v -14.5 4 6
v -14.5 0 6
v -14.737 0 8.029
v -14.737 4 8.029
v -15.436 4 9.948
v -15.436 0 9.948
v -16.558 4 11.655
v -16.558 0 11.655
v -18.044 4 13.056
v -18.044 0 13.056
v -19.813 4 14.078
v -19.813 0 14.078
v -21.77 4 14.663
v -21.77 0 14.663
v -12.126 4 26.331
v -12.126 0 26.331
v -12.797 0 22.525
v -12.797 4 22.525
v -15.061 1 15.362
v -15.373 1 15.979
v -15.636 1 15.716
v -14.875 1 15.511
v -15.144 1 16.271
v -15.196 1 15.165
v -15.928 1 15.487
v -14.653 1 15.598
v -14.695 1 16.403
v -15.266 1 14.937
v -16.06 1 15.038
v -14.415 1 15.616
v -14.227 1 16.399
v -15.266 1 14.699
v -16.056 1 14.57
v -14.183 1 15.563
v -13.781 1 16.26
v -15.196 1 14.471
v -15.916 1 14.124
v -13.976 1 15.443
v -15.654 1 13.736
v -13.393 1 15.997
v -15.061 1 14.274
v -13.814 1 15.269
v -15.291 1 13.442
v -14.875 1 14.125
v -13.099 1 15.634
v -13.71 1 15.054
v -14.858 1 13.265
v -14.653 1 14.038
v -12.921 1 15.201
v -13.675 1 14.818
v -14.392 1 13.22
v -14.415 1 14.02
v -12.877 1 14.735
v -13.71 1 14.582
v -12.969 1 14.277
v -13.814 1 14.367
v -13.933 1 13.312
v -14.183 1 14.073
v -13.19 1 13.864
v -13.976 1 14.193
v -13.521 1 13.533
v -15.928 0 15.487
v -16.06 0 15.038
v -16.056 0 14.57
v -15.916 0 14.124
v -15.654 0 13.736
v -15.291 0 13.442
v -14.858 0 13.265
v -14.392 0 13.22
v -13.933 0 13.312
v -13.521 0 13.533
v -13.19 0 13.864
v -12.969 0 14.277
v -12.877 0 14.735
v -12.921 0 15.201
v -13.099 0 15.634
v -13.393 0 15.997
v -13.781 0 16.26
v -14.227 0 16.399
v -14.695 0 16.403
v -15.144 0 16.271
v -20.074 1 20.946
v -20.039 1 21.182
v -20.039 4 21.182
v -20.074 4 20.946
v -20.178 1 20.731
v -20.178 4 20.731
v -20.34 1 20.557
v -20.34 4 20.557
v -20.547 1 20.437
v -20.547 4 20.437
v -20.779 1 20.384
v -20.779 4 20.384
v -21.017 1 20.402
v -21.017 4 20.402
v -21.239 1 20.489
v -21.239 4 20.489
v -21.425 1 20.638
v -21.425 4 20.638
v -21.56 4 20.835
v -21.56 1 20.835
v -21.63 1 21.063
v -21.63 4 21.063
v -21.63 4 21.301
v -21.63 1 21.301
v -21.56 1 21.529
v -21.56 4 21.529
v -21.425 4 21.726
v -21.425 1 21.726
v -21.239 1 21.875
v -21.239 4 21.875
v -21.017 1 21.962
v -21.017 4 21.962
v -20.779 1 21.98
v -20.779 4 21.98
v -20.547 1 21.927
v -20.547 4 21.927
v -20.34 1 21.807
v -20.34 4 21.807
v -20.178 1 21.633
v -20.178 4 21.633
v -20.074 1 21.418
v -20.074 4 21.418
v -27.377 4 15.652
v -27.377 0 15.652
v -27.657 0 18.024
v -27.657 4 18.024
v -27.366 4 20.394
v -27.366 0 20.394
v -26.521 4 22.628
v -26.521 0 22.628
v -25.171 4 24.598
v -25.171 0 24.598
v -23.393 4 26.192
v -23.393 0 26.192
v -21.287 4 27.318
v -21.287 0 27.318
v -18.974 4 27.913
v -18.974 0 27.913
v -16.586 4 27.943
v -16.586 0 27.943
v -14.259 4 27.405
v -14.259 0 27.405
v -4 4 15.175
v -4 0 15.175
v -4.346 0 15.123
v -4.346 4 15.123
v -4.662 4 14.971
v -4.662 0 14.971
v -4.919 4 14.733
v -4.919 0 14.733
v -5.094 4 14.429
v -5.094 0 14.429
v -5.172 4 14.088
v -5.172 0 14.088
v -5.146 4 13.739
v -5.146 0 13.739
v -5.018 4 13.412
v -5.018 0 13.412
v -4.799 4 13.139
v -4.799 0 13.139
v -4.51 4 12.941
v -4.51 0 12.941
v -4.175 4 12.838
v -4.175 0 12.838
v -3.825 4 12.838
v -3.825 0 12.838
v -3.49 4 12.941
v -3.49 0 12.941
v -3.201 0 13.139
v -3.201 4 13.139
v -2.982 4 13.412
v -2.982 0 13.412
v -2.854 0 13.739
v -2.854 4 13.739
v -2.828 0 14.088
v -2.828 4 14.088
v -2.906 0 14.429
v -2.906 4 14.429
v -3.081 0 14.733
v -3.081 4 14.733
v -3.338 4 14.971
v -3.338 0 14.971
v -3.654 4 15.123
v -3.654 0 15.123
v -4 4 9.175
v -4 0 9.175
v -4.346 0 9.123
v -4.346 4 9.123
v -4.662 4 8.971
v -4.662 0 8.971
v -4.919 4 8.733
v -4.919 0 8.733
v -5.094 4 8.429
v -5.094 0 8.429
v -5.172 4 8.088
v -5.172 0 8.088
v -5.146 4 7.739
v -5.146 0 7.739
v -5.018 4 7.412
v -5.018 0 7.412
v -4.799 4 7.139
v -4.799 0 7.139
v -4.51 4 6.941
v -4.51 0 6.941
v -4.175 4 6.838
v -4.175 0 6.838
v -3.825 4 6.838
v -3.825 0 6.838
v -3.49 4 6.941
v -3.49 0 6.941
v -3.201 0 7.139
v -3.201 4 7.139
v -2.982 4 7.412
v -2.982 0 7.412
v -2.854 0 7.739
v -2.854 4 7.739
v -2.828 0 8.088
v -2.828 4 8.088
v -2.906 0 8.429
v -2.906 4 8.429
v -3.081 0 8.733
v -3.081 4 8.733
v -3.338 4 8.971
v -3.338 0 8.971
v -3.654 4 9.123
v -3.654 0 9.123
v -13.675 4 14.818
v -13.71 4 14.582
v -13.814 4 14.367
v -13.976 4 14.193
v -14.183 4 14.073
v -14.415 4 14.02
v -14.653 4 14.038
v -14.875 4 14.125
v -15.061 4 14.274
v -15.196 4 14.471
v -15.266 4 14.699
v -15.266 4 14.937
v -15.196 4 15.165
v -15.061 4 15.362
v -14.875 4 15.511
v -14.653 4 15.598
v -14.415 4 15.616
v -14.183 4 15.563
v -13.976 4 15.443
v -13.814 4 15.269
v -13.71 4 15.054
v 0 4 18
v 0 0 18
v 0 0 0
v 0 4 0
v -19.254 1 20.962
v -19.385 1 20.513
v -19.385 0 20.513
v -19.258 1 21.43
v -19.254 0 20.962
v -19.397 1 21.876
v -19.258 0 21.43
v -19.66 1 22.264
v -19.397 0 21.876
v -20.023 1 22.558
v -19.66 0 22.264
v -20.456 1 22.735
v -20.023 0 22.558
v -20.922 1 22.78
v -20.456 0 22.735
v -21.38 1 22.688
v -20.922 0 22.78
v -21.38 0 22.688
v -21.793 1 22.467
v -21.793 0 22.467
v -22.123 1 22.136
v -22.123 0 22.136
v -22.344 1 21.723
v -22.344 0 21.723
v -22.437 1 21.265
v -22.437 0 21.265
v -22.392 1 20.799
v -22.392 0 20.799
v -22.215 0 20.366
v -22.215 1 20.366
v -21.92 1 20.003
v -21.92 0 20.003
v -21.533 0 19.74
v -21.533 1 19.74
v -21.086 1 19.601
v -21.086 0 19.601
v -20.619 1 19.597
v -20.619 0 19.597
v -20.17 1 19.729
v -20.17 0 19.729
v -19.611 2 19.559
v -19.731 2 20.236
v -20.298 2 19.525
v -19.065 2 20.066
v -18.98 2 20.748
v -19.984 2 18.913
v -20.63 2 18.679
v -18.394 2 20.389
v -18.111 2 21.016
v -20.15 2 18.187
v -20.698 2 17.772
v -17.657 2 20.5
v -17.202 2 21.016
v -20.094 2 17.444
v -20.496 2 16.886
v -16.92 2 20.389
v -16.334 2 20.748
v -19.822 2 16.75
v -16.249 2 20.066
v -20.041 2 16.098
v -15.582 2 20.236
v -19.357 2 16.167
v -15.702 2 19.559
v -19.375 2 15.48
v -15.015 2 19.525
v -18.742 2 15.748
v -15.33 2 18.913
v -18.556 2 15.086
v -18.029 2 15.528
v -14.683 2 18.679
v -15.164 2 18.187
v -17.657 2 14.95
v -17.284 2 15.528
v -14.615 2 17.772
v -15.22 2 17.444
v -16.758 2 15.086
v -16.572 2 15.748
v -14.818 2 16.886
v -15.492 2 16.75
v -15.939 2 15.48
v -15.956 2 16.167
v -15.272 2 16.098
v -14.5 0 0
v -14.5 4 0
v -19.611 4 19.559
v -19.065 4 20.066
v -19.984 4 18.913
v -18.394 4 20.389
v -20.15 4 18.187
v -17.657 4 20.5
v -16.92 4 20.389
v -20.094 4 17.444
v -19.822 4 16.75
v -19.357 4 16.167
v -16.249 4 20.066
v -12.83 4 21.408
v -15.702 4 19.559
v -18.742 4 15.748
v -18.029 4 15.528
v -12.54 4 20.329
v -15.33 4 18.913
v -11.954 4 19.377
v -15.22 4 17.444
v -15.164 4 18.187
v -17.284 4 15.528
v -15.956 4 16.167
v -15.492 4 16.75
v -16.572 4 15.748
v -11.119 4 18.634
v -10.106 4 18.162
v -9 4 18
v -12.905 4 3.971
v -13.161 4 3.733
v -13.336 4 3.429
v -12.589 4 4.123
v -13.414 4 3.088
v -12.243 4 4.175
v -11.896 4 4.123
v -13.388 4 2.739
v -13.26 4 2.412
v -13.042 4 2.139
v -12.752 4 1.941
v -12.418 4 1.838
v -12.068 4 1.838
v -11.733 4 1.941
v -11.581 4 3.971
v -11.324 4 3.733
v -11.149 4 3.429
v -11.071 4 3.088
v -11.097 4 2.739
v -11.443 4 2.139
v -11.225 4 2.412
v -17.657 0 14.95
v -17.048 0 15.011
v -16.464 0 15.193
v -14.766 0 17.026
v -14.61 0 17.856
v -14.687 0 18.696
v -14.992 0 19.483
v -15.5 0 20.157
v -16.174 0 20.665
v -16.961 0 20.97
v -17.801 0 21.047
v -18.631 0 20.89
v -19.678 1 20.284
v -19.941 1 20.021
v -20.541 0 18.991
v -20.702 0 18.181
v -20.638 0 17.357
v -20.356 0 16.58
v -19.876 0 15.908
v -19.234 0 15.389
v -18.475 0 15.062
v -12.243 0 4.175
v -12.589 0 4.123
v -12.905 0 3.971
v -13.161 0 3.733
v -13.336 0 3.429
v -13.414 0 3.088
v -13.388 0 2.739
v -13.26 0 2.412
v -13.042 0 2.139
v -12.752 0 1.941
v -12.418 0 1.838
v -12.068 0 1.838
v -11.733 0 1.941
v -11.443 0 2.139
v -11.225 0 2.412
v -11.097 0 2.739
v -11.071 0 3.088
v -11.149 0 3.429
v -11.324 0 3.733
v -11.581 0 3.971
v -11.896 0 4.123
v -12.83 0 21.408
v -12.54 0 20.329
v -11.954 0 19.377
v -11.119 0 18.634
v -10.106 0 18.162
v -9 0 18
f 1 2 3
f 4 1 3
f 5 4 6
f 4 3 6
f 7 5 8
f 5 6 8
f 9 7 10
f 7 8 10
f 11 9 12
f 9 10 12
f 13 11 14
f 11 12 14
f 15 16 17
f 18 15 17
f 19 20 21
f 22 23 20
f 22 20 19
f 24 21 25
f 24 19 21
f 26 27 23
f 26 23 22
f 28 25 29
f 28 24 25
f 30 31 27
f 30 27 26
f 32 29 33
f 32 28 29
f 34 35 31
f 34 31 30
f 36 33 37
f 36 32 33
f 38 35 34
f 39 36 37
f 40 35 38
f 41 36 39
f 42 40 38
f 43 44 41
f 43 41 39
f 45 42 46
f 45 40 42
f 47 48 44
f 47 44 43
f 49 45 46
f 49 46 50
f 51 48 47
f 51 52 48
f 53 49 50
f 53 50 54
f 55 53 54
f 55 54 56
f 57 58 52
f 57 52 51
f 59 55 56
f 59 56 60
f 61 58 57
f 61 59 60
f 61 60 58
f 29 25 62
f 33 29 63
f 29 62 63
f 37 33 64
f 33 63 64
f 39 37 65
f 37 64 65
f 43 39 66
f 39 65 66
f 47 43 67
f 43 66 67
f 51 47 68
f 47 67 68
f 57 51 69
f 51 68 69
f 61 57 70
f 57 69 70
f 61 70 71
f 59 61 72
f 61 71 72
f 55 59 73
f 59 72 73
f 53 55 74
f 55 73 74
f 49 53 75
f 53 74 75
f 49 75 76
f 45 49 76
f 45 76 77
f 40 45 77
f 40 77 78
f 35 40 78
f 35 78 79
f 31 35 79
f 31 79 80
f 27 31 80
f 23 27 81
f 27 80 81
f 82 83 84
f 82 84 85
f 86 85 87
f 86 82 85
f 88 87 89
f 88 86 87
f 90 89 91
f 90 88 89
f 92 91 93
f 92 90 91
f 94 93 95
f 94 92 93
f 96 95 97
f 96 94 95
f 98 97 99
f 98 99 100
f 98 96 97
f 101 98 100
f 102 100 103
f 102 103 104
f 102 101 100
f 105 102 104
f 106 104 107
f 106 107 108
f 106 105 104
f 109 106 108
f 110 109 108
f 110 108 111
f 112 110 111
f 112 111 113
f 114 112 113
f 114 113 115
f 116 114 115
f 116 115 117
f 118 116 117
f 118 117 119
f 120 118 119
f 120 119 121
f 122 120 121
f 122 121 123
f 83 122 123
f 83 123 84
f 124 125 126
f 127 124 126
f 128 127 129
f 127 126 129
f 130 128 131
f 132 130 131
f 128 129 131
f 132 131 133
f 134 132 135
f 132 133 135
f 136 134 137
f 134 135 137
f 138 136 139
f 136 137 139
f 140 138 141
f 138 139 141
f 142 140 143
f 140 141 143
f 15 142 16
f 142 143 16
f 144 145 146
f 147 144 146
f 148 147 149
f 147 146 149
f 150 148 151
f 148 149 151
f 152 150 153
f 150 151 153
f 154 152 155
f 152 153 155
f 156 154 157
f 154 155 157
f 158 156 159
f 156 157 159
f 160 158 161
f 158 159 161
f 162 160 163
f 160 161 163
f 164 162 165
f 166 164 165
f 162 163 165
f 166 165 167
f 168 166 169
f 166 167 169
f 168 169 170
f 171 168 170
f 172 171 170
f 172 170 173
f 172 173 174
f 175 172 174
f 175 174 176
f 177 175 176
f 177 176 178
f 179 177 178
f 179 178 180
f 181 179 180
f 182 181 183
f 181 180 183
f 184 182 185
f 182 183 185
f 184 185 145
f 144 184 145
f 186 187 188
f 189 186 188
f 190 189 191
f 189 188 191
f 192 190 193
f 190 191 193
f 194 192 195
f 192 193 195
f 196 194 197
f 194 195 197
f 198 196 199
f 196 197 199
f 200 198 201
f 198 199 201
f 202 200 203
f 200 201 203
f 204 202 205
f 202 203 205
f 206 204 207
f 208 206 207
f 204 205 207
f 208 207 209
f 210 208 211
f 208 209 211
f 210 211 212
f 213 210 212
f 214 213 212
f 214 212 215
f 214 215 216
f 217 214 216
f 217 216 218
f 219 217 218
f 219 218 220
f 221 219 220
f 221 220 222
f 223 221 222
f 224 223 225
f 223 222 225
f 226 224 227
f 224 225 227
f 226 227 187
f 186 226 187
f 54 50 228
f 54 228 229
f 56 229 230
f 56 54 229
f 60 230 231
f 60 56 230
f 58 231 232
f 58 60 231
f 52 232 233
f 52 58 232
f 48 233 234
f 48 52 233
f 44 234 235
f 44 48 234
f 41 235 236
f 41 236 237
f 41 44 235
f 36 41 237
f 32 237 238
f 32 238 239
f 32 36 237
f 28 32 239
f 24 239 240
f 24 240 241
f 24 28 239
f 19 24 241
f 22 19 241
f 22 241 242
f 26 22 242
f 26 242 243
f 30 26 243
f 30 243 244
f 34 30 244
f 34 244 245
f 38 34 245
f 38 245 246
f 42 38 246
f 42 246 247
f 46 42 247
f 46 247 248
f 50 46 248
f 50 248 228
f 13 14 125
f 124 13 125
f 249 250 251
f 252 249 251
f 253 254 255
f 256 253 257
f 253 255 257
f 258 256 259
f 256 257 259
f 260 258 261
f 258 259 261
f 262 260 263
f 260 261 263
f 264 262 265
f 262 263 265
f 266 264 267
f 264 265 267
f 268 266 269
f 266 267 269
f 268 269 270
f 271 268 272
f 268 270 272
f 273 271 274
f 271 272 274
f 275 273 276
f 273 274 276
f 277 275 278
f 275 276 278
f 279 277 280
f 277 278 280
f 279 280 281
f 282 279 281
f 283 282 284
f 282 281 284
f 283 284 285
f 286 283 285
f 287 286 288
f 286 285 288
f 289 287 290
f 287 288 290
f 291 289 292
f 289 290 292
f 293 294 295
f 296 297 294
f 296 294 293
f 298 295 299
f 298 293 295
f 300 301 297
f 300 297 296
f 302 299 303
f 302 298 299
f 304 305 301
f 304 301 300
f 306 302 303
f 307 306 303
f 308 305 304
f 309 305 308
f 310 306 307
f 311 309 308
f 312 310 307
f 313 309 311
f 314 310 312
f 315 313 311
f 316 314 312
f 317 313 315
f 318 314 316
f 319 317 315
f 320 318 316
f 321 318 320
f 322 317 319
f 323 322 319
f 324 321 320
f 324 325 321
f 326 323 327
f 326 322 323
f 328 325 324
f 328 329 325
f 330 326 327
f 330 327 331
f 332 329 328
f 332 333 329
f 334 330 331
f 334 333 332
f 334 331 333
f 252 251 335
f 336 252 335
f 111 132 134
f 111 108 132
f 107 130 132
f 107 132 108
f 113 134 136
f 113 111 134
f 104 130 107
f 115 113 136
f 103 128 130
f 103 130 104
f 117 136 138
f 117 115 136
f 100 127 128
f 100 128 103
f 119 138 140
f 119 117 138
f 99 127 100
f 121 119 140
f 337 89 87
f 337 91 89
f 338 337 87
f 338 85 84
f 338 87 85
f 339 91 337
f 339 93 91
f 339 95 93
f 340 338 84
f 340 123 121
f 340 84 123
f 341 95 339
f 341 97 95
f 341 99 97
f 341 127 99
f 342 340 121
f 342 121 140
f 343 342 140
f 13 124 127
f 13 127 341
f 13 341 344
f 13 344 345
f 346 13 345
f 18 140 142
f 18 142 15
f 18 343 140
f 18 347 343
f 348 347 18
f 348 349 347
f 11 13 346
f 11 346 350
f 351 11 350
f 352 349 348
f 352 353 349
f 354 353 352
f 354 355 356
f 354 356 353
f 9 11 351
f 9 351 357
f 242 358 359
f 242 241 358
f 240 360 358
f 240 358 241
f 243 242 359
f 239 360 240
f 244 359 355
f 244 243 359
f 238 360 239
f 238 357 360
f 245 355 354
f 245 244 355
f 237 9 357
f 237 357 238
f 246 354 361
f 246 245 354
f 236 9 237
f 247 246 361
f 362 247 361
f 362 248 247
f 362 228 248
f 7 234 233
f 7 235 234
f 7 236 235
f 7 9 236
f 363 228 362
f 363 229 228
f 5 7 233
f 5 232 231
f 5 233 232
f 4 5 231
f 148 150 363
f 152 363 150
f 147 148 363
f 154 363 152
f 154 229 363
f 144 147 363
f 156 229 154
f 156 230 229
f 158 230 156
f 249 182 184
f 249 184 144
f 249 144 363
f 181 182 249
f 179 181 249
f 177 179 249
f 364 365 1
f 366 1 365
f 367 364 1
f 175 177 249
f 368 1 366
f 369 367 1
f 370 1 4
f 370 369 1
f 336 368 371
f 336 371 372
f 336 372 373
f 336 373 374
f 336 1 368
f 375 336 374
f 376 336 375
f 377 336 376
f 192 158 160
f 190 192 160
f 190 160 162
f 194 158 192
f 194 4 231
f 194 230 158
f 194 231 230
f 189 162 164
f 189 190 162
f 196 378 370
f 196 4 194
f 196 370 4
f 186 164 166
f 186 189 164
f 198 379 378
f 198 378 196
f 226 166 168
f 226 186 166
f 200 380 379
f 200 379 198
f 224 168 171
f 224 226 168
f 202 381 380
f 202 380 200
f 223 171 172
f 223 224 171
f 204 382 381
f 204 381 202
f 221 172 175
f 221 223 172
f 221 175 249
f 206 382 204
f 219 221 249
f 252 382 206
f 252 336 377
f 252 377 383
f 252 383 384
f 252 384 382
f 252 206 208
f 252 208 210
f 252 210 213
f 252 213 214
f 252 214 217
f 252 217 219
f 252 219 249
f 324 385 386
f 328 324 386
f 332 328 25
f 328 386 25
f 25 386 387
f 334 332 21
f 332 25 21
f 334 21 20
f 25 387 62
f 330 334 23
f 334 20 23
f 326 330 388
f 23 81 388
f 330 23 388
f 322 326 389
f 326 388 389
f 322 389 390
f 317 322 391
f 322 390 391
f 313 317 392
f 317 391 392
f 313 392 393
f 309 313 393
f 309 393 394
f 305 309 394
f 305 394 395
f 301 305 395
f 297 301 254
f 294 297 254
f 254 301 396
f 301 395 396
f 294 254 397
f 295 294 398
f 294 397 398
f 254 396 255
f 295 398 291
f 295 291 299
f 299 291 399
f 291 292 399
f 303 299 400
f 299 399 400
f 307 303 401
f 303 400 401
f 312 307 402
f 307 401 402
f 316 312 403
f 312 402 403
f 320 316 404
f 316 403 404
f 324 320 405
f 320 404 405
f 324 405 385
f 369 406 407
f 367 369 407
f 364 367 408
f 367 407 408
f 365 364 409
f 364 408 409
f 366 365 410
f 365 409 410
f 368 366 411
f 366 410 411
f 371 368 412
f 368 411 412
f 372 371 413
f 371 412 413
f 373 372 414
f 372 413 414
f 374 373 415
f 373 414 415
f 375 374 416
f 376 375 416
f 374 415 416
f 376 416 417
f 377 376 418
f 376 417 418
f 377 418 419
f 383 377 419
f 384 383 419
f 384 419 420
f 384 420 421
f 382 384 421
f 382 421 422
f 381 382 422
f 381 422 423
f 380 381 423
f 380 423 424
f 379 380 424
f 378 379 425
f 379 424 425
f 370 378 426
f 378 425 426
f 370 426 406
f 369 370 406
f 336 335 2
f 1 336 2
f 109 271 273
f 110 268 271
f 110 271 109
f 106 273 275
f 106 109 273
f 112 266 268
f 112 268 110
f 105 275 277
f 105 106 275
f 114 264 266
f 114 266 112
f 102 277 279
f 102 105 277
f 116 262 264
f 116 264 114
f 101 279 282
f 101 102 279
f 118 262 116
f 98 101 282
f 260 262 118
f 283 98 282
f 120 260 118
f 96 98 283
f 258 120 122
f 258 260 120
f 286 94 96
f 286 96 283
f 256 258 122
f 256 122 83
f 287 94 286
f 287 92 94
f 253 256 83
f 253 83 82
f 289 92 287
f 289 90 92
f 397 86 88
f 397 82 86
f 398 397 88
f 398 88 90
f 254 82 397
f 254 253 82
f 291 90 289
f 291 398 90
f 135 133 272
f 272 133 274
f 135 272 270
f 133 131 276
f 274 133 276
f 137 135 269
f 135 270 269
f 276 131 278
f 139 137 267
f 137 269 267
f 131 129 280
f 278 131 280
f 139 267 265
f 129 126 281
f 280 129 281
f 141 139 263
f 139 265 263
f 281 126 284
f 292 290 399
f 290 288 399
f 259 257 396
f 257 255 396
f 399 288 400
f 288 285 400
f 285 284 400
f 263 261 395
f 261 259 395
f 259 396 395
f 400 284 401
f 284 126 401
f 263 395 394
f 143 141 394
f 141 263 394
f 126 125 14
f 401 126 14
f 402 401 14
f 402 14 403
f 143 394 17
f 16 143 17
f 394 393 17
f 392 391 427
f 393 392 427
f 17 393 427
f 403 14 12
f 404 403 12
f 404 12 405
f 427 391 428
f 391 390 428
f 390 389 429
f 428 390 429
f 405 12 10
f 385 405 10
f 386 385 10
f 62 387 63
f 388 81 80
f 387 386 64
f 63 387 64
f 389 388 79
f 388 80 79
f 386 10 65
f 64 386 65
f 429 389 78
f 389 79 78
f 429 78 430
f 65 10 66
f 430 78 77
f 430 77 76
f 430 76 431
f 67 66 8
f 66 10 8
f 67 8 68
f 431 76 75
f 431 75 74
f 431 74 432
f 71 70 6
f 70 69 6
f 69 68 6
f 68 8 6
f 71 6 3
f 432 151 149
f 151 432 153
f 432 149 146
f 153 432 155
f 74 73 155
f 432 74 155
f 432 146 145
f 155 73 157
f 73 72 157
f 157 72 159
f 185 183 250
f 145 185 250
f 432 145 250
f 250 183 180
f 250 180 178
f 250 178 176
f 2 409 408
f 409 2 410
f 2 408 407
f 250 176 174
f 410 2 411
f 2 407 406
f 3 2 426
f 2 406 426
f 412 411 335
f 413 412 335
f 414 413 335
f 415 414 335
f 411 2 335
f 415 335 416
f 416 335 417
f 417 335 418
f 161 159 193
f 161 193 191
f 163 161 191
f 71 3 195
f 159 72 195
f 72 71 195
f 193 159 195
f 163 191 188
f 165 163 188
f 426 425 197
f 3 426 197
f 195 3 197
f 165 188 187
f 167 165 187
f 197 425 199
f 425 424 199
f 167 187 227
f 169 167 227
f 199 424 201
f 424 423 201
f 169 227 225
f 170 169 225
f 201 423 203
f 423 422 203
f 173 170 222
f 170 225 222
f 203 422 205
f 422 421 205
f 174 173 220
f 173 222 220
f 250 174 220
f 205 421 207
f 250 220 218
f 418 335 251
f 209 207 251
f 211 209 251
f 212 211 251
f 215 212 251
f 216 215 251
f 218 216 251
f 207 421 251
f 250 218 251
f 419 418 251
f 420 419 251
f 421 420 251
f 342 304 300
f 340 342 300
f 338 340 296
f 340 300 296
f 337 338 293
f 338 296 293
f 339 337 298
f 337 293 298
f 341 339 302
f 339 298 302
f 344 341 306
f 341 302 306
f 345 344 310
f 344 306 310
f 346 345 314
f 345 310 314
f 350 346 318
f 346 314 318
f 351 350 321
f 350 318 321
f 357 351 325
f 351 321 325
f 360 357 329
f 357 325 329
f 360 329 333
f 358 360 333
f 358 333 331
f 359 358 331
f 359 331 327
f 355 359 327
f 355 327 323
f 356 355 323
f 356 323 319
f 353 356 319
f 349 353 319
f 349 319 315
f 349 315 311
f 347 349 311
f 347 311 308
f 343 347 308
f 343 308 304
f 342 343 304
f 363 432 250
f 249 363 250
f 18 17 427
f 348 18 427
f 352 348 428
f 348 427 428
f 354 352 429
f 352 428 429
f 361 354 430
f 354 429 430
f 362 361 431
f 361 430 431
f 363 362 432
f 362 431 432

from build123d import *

# Parameters (mm, degrees)
SKETCH_3_R              = 1.175
SKETCH_3_R_2            = 2.5
EXTRUDE_2_DEPTH         = 4
HOLE_WIZARD_1_6_1_6_1_D = 1.6
SKETCH_11_R             = 1.6
CUT_EXTRUDE_1_DEPTH     = 1
SKETCH_12_R             = 3.05
CUT_EXTRUDE_2_DEPTH     = 2


with BuildPart() as part:
    # 草图3 → 凸台-拉伸2 (new body)
    with BuildSketch(Plane(origin=(0, 0, 0), x_dir=(1, 0, 0), z_dir=(0, 1, 0))):
        with BuildLine():
            Line((0, 0), (14.5, 0))
            Line((14.5, 0), (14.5, -6))
            ThreePointArc((14.5, -6), (16.558133666, -11.654675774), (21.769511049, -14.663465909))
            Line((21.769511049, -14.663465909), (27.377359106, -15.652280825))
            ThreePointArc((27.377359106, -15.652280825), (23.392618613, -26.191520443), (12.126111401, -26.331319436))
            Line((12.126111401, -26.331319436), (12.79720876, -22.525337182))
            ThreePointArc((12.79720876, -22.525337182), (11.953704072, -19.377334829), (9, -18))
            Line((9, -18), (0, -18))
            Line((0, -18), (0, 0))
        make_face()
        with Locations(Location((4, -14, 0), (0, 0, 270))):
            Circle(SKETCH_3_R, mode=Mode.SUBTRACT)
        with Locations(Location((4, -8, 0), (0, 0, 270))):
            Circle(SKETCH_3_R, mode=Mode.SUBTRACT)
        with Locations(Location((12.242640687, -3, 0), (0, 0, 270))):
            Circle(SKETCH_3_R, mode=Mode.SUBTRACT)
        with Locations(Location((17.656854249, -18, 0), (0, 0, 270))):
            Circle(SKETCH_3_R_2, mode=Mode.SUBTRACT)
    extrude(amount=EXTRUDE_2_DEPTH)

    # Ø1.6 (1.6) 直径孔1 (through all)
    with Locations(Plane(origin=(0, 4, 0), x_dir=(1, 0, 0), z_dir=(0, 1, 0))):
        with Locations((20.838834765, -21.181980515), (14.474873734, -14.818019485)):
            Hole(HOLE_WIZARD_1_6_1_6_1_D / 2)


with BuildPart() as body_2:
    # 镜向1: mirrored copy
    add(part.part.mirror(Plane(origin=(0, 4, 0), x_dir=(0, 0, 1), z_dir=(1, 0, 0))))

    # 草图11 → 切除-拉伸1 (cut)
    with BuildSketch(Plane(origin=(0, 0, 0), x_dir=(-1, 0, 0), z_dir=(0, -1, 0))):
        with Locations(Location((14.474873734, -14.818019485, 0), (0, 0, 90))):
            Circle(SKETCH_11_R)
        with Locations(Location((20.838834765, -21.181980515, 0), (0, 0, 90))):
            Circle(SKETCH_11_R)
    extrude(amount=-CUT_EXTRUDE_1_DEPTH, mode=Mode.SUBTRACT)

    # 草图12 → 切除-拉伸2 (cut)
    with BuildSketch(Plane(origin=(0, 0, 0), x_dir=(-1, 0, 0), z_dir=(0, -1, 0))):
        with Locations(Location((17.656854249, -18, 0), (0, 0, 90))):
            Circle(SKETCH_12_R)
    extrude(amount=-CUT_EXTRUDE_2_DEPTH, mode=Mode.SUBTRACT)


solid = body_2.part
